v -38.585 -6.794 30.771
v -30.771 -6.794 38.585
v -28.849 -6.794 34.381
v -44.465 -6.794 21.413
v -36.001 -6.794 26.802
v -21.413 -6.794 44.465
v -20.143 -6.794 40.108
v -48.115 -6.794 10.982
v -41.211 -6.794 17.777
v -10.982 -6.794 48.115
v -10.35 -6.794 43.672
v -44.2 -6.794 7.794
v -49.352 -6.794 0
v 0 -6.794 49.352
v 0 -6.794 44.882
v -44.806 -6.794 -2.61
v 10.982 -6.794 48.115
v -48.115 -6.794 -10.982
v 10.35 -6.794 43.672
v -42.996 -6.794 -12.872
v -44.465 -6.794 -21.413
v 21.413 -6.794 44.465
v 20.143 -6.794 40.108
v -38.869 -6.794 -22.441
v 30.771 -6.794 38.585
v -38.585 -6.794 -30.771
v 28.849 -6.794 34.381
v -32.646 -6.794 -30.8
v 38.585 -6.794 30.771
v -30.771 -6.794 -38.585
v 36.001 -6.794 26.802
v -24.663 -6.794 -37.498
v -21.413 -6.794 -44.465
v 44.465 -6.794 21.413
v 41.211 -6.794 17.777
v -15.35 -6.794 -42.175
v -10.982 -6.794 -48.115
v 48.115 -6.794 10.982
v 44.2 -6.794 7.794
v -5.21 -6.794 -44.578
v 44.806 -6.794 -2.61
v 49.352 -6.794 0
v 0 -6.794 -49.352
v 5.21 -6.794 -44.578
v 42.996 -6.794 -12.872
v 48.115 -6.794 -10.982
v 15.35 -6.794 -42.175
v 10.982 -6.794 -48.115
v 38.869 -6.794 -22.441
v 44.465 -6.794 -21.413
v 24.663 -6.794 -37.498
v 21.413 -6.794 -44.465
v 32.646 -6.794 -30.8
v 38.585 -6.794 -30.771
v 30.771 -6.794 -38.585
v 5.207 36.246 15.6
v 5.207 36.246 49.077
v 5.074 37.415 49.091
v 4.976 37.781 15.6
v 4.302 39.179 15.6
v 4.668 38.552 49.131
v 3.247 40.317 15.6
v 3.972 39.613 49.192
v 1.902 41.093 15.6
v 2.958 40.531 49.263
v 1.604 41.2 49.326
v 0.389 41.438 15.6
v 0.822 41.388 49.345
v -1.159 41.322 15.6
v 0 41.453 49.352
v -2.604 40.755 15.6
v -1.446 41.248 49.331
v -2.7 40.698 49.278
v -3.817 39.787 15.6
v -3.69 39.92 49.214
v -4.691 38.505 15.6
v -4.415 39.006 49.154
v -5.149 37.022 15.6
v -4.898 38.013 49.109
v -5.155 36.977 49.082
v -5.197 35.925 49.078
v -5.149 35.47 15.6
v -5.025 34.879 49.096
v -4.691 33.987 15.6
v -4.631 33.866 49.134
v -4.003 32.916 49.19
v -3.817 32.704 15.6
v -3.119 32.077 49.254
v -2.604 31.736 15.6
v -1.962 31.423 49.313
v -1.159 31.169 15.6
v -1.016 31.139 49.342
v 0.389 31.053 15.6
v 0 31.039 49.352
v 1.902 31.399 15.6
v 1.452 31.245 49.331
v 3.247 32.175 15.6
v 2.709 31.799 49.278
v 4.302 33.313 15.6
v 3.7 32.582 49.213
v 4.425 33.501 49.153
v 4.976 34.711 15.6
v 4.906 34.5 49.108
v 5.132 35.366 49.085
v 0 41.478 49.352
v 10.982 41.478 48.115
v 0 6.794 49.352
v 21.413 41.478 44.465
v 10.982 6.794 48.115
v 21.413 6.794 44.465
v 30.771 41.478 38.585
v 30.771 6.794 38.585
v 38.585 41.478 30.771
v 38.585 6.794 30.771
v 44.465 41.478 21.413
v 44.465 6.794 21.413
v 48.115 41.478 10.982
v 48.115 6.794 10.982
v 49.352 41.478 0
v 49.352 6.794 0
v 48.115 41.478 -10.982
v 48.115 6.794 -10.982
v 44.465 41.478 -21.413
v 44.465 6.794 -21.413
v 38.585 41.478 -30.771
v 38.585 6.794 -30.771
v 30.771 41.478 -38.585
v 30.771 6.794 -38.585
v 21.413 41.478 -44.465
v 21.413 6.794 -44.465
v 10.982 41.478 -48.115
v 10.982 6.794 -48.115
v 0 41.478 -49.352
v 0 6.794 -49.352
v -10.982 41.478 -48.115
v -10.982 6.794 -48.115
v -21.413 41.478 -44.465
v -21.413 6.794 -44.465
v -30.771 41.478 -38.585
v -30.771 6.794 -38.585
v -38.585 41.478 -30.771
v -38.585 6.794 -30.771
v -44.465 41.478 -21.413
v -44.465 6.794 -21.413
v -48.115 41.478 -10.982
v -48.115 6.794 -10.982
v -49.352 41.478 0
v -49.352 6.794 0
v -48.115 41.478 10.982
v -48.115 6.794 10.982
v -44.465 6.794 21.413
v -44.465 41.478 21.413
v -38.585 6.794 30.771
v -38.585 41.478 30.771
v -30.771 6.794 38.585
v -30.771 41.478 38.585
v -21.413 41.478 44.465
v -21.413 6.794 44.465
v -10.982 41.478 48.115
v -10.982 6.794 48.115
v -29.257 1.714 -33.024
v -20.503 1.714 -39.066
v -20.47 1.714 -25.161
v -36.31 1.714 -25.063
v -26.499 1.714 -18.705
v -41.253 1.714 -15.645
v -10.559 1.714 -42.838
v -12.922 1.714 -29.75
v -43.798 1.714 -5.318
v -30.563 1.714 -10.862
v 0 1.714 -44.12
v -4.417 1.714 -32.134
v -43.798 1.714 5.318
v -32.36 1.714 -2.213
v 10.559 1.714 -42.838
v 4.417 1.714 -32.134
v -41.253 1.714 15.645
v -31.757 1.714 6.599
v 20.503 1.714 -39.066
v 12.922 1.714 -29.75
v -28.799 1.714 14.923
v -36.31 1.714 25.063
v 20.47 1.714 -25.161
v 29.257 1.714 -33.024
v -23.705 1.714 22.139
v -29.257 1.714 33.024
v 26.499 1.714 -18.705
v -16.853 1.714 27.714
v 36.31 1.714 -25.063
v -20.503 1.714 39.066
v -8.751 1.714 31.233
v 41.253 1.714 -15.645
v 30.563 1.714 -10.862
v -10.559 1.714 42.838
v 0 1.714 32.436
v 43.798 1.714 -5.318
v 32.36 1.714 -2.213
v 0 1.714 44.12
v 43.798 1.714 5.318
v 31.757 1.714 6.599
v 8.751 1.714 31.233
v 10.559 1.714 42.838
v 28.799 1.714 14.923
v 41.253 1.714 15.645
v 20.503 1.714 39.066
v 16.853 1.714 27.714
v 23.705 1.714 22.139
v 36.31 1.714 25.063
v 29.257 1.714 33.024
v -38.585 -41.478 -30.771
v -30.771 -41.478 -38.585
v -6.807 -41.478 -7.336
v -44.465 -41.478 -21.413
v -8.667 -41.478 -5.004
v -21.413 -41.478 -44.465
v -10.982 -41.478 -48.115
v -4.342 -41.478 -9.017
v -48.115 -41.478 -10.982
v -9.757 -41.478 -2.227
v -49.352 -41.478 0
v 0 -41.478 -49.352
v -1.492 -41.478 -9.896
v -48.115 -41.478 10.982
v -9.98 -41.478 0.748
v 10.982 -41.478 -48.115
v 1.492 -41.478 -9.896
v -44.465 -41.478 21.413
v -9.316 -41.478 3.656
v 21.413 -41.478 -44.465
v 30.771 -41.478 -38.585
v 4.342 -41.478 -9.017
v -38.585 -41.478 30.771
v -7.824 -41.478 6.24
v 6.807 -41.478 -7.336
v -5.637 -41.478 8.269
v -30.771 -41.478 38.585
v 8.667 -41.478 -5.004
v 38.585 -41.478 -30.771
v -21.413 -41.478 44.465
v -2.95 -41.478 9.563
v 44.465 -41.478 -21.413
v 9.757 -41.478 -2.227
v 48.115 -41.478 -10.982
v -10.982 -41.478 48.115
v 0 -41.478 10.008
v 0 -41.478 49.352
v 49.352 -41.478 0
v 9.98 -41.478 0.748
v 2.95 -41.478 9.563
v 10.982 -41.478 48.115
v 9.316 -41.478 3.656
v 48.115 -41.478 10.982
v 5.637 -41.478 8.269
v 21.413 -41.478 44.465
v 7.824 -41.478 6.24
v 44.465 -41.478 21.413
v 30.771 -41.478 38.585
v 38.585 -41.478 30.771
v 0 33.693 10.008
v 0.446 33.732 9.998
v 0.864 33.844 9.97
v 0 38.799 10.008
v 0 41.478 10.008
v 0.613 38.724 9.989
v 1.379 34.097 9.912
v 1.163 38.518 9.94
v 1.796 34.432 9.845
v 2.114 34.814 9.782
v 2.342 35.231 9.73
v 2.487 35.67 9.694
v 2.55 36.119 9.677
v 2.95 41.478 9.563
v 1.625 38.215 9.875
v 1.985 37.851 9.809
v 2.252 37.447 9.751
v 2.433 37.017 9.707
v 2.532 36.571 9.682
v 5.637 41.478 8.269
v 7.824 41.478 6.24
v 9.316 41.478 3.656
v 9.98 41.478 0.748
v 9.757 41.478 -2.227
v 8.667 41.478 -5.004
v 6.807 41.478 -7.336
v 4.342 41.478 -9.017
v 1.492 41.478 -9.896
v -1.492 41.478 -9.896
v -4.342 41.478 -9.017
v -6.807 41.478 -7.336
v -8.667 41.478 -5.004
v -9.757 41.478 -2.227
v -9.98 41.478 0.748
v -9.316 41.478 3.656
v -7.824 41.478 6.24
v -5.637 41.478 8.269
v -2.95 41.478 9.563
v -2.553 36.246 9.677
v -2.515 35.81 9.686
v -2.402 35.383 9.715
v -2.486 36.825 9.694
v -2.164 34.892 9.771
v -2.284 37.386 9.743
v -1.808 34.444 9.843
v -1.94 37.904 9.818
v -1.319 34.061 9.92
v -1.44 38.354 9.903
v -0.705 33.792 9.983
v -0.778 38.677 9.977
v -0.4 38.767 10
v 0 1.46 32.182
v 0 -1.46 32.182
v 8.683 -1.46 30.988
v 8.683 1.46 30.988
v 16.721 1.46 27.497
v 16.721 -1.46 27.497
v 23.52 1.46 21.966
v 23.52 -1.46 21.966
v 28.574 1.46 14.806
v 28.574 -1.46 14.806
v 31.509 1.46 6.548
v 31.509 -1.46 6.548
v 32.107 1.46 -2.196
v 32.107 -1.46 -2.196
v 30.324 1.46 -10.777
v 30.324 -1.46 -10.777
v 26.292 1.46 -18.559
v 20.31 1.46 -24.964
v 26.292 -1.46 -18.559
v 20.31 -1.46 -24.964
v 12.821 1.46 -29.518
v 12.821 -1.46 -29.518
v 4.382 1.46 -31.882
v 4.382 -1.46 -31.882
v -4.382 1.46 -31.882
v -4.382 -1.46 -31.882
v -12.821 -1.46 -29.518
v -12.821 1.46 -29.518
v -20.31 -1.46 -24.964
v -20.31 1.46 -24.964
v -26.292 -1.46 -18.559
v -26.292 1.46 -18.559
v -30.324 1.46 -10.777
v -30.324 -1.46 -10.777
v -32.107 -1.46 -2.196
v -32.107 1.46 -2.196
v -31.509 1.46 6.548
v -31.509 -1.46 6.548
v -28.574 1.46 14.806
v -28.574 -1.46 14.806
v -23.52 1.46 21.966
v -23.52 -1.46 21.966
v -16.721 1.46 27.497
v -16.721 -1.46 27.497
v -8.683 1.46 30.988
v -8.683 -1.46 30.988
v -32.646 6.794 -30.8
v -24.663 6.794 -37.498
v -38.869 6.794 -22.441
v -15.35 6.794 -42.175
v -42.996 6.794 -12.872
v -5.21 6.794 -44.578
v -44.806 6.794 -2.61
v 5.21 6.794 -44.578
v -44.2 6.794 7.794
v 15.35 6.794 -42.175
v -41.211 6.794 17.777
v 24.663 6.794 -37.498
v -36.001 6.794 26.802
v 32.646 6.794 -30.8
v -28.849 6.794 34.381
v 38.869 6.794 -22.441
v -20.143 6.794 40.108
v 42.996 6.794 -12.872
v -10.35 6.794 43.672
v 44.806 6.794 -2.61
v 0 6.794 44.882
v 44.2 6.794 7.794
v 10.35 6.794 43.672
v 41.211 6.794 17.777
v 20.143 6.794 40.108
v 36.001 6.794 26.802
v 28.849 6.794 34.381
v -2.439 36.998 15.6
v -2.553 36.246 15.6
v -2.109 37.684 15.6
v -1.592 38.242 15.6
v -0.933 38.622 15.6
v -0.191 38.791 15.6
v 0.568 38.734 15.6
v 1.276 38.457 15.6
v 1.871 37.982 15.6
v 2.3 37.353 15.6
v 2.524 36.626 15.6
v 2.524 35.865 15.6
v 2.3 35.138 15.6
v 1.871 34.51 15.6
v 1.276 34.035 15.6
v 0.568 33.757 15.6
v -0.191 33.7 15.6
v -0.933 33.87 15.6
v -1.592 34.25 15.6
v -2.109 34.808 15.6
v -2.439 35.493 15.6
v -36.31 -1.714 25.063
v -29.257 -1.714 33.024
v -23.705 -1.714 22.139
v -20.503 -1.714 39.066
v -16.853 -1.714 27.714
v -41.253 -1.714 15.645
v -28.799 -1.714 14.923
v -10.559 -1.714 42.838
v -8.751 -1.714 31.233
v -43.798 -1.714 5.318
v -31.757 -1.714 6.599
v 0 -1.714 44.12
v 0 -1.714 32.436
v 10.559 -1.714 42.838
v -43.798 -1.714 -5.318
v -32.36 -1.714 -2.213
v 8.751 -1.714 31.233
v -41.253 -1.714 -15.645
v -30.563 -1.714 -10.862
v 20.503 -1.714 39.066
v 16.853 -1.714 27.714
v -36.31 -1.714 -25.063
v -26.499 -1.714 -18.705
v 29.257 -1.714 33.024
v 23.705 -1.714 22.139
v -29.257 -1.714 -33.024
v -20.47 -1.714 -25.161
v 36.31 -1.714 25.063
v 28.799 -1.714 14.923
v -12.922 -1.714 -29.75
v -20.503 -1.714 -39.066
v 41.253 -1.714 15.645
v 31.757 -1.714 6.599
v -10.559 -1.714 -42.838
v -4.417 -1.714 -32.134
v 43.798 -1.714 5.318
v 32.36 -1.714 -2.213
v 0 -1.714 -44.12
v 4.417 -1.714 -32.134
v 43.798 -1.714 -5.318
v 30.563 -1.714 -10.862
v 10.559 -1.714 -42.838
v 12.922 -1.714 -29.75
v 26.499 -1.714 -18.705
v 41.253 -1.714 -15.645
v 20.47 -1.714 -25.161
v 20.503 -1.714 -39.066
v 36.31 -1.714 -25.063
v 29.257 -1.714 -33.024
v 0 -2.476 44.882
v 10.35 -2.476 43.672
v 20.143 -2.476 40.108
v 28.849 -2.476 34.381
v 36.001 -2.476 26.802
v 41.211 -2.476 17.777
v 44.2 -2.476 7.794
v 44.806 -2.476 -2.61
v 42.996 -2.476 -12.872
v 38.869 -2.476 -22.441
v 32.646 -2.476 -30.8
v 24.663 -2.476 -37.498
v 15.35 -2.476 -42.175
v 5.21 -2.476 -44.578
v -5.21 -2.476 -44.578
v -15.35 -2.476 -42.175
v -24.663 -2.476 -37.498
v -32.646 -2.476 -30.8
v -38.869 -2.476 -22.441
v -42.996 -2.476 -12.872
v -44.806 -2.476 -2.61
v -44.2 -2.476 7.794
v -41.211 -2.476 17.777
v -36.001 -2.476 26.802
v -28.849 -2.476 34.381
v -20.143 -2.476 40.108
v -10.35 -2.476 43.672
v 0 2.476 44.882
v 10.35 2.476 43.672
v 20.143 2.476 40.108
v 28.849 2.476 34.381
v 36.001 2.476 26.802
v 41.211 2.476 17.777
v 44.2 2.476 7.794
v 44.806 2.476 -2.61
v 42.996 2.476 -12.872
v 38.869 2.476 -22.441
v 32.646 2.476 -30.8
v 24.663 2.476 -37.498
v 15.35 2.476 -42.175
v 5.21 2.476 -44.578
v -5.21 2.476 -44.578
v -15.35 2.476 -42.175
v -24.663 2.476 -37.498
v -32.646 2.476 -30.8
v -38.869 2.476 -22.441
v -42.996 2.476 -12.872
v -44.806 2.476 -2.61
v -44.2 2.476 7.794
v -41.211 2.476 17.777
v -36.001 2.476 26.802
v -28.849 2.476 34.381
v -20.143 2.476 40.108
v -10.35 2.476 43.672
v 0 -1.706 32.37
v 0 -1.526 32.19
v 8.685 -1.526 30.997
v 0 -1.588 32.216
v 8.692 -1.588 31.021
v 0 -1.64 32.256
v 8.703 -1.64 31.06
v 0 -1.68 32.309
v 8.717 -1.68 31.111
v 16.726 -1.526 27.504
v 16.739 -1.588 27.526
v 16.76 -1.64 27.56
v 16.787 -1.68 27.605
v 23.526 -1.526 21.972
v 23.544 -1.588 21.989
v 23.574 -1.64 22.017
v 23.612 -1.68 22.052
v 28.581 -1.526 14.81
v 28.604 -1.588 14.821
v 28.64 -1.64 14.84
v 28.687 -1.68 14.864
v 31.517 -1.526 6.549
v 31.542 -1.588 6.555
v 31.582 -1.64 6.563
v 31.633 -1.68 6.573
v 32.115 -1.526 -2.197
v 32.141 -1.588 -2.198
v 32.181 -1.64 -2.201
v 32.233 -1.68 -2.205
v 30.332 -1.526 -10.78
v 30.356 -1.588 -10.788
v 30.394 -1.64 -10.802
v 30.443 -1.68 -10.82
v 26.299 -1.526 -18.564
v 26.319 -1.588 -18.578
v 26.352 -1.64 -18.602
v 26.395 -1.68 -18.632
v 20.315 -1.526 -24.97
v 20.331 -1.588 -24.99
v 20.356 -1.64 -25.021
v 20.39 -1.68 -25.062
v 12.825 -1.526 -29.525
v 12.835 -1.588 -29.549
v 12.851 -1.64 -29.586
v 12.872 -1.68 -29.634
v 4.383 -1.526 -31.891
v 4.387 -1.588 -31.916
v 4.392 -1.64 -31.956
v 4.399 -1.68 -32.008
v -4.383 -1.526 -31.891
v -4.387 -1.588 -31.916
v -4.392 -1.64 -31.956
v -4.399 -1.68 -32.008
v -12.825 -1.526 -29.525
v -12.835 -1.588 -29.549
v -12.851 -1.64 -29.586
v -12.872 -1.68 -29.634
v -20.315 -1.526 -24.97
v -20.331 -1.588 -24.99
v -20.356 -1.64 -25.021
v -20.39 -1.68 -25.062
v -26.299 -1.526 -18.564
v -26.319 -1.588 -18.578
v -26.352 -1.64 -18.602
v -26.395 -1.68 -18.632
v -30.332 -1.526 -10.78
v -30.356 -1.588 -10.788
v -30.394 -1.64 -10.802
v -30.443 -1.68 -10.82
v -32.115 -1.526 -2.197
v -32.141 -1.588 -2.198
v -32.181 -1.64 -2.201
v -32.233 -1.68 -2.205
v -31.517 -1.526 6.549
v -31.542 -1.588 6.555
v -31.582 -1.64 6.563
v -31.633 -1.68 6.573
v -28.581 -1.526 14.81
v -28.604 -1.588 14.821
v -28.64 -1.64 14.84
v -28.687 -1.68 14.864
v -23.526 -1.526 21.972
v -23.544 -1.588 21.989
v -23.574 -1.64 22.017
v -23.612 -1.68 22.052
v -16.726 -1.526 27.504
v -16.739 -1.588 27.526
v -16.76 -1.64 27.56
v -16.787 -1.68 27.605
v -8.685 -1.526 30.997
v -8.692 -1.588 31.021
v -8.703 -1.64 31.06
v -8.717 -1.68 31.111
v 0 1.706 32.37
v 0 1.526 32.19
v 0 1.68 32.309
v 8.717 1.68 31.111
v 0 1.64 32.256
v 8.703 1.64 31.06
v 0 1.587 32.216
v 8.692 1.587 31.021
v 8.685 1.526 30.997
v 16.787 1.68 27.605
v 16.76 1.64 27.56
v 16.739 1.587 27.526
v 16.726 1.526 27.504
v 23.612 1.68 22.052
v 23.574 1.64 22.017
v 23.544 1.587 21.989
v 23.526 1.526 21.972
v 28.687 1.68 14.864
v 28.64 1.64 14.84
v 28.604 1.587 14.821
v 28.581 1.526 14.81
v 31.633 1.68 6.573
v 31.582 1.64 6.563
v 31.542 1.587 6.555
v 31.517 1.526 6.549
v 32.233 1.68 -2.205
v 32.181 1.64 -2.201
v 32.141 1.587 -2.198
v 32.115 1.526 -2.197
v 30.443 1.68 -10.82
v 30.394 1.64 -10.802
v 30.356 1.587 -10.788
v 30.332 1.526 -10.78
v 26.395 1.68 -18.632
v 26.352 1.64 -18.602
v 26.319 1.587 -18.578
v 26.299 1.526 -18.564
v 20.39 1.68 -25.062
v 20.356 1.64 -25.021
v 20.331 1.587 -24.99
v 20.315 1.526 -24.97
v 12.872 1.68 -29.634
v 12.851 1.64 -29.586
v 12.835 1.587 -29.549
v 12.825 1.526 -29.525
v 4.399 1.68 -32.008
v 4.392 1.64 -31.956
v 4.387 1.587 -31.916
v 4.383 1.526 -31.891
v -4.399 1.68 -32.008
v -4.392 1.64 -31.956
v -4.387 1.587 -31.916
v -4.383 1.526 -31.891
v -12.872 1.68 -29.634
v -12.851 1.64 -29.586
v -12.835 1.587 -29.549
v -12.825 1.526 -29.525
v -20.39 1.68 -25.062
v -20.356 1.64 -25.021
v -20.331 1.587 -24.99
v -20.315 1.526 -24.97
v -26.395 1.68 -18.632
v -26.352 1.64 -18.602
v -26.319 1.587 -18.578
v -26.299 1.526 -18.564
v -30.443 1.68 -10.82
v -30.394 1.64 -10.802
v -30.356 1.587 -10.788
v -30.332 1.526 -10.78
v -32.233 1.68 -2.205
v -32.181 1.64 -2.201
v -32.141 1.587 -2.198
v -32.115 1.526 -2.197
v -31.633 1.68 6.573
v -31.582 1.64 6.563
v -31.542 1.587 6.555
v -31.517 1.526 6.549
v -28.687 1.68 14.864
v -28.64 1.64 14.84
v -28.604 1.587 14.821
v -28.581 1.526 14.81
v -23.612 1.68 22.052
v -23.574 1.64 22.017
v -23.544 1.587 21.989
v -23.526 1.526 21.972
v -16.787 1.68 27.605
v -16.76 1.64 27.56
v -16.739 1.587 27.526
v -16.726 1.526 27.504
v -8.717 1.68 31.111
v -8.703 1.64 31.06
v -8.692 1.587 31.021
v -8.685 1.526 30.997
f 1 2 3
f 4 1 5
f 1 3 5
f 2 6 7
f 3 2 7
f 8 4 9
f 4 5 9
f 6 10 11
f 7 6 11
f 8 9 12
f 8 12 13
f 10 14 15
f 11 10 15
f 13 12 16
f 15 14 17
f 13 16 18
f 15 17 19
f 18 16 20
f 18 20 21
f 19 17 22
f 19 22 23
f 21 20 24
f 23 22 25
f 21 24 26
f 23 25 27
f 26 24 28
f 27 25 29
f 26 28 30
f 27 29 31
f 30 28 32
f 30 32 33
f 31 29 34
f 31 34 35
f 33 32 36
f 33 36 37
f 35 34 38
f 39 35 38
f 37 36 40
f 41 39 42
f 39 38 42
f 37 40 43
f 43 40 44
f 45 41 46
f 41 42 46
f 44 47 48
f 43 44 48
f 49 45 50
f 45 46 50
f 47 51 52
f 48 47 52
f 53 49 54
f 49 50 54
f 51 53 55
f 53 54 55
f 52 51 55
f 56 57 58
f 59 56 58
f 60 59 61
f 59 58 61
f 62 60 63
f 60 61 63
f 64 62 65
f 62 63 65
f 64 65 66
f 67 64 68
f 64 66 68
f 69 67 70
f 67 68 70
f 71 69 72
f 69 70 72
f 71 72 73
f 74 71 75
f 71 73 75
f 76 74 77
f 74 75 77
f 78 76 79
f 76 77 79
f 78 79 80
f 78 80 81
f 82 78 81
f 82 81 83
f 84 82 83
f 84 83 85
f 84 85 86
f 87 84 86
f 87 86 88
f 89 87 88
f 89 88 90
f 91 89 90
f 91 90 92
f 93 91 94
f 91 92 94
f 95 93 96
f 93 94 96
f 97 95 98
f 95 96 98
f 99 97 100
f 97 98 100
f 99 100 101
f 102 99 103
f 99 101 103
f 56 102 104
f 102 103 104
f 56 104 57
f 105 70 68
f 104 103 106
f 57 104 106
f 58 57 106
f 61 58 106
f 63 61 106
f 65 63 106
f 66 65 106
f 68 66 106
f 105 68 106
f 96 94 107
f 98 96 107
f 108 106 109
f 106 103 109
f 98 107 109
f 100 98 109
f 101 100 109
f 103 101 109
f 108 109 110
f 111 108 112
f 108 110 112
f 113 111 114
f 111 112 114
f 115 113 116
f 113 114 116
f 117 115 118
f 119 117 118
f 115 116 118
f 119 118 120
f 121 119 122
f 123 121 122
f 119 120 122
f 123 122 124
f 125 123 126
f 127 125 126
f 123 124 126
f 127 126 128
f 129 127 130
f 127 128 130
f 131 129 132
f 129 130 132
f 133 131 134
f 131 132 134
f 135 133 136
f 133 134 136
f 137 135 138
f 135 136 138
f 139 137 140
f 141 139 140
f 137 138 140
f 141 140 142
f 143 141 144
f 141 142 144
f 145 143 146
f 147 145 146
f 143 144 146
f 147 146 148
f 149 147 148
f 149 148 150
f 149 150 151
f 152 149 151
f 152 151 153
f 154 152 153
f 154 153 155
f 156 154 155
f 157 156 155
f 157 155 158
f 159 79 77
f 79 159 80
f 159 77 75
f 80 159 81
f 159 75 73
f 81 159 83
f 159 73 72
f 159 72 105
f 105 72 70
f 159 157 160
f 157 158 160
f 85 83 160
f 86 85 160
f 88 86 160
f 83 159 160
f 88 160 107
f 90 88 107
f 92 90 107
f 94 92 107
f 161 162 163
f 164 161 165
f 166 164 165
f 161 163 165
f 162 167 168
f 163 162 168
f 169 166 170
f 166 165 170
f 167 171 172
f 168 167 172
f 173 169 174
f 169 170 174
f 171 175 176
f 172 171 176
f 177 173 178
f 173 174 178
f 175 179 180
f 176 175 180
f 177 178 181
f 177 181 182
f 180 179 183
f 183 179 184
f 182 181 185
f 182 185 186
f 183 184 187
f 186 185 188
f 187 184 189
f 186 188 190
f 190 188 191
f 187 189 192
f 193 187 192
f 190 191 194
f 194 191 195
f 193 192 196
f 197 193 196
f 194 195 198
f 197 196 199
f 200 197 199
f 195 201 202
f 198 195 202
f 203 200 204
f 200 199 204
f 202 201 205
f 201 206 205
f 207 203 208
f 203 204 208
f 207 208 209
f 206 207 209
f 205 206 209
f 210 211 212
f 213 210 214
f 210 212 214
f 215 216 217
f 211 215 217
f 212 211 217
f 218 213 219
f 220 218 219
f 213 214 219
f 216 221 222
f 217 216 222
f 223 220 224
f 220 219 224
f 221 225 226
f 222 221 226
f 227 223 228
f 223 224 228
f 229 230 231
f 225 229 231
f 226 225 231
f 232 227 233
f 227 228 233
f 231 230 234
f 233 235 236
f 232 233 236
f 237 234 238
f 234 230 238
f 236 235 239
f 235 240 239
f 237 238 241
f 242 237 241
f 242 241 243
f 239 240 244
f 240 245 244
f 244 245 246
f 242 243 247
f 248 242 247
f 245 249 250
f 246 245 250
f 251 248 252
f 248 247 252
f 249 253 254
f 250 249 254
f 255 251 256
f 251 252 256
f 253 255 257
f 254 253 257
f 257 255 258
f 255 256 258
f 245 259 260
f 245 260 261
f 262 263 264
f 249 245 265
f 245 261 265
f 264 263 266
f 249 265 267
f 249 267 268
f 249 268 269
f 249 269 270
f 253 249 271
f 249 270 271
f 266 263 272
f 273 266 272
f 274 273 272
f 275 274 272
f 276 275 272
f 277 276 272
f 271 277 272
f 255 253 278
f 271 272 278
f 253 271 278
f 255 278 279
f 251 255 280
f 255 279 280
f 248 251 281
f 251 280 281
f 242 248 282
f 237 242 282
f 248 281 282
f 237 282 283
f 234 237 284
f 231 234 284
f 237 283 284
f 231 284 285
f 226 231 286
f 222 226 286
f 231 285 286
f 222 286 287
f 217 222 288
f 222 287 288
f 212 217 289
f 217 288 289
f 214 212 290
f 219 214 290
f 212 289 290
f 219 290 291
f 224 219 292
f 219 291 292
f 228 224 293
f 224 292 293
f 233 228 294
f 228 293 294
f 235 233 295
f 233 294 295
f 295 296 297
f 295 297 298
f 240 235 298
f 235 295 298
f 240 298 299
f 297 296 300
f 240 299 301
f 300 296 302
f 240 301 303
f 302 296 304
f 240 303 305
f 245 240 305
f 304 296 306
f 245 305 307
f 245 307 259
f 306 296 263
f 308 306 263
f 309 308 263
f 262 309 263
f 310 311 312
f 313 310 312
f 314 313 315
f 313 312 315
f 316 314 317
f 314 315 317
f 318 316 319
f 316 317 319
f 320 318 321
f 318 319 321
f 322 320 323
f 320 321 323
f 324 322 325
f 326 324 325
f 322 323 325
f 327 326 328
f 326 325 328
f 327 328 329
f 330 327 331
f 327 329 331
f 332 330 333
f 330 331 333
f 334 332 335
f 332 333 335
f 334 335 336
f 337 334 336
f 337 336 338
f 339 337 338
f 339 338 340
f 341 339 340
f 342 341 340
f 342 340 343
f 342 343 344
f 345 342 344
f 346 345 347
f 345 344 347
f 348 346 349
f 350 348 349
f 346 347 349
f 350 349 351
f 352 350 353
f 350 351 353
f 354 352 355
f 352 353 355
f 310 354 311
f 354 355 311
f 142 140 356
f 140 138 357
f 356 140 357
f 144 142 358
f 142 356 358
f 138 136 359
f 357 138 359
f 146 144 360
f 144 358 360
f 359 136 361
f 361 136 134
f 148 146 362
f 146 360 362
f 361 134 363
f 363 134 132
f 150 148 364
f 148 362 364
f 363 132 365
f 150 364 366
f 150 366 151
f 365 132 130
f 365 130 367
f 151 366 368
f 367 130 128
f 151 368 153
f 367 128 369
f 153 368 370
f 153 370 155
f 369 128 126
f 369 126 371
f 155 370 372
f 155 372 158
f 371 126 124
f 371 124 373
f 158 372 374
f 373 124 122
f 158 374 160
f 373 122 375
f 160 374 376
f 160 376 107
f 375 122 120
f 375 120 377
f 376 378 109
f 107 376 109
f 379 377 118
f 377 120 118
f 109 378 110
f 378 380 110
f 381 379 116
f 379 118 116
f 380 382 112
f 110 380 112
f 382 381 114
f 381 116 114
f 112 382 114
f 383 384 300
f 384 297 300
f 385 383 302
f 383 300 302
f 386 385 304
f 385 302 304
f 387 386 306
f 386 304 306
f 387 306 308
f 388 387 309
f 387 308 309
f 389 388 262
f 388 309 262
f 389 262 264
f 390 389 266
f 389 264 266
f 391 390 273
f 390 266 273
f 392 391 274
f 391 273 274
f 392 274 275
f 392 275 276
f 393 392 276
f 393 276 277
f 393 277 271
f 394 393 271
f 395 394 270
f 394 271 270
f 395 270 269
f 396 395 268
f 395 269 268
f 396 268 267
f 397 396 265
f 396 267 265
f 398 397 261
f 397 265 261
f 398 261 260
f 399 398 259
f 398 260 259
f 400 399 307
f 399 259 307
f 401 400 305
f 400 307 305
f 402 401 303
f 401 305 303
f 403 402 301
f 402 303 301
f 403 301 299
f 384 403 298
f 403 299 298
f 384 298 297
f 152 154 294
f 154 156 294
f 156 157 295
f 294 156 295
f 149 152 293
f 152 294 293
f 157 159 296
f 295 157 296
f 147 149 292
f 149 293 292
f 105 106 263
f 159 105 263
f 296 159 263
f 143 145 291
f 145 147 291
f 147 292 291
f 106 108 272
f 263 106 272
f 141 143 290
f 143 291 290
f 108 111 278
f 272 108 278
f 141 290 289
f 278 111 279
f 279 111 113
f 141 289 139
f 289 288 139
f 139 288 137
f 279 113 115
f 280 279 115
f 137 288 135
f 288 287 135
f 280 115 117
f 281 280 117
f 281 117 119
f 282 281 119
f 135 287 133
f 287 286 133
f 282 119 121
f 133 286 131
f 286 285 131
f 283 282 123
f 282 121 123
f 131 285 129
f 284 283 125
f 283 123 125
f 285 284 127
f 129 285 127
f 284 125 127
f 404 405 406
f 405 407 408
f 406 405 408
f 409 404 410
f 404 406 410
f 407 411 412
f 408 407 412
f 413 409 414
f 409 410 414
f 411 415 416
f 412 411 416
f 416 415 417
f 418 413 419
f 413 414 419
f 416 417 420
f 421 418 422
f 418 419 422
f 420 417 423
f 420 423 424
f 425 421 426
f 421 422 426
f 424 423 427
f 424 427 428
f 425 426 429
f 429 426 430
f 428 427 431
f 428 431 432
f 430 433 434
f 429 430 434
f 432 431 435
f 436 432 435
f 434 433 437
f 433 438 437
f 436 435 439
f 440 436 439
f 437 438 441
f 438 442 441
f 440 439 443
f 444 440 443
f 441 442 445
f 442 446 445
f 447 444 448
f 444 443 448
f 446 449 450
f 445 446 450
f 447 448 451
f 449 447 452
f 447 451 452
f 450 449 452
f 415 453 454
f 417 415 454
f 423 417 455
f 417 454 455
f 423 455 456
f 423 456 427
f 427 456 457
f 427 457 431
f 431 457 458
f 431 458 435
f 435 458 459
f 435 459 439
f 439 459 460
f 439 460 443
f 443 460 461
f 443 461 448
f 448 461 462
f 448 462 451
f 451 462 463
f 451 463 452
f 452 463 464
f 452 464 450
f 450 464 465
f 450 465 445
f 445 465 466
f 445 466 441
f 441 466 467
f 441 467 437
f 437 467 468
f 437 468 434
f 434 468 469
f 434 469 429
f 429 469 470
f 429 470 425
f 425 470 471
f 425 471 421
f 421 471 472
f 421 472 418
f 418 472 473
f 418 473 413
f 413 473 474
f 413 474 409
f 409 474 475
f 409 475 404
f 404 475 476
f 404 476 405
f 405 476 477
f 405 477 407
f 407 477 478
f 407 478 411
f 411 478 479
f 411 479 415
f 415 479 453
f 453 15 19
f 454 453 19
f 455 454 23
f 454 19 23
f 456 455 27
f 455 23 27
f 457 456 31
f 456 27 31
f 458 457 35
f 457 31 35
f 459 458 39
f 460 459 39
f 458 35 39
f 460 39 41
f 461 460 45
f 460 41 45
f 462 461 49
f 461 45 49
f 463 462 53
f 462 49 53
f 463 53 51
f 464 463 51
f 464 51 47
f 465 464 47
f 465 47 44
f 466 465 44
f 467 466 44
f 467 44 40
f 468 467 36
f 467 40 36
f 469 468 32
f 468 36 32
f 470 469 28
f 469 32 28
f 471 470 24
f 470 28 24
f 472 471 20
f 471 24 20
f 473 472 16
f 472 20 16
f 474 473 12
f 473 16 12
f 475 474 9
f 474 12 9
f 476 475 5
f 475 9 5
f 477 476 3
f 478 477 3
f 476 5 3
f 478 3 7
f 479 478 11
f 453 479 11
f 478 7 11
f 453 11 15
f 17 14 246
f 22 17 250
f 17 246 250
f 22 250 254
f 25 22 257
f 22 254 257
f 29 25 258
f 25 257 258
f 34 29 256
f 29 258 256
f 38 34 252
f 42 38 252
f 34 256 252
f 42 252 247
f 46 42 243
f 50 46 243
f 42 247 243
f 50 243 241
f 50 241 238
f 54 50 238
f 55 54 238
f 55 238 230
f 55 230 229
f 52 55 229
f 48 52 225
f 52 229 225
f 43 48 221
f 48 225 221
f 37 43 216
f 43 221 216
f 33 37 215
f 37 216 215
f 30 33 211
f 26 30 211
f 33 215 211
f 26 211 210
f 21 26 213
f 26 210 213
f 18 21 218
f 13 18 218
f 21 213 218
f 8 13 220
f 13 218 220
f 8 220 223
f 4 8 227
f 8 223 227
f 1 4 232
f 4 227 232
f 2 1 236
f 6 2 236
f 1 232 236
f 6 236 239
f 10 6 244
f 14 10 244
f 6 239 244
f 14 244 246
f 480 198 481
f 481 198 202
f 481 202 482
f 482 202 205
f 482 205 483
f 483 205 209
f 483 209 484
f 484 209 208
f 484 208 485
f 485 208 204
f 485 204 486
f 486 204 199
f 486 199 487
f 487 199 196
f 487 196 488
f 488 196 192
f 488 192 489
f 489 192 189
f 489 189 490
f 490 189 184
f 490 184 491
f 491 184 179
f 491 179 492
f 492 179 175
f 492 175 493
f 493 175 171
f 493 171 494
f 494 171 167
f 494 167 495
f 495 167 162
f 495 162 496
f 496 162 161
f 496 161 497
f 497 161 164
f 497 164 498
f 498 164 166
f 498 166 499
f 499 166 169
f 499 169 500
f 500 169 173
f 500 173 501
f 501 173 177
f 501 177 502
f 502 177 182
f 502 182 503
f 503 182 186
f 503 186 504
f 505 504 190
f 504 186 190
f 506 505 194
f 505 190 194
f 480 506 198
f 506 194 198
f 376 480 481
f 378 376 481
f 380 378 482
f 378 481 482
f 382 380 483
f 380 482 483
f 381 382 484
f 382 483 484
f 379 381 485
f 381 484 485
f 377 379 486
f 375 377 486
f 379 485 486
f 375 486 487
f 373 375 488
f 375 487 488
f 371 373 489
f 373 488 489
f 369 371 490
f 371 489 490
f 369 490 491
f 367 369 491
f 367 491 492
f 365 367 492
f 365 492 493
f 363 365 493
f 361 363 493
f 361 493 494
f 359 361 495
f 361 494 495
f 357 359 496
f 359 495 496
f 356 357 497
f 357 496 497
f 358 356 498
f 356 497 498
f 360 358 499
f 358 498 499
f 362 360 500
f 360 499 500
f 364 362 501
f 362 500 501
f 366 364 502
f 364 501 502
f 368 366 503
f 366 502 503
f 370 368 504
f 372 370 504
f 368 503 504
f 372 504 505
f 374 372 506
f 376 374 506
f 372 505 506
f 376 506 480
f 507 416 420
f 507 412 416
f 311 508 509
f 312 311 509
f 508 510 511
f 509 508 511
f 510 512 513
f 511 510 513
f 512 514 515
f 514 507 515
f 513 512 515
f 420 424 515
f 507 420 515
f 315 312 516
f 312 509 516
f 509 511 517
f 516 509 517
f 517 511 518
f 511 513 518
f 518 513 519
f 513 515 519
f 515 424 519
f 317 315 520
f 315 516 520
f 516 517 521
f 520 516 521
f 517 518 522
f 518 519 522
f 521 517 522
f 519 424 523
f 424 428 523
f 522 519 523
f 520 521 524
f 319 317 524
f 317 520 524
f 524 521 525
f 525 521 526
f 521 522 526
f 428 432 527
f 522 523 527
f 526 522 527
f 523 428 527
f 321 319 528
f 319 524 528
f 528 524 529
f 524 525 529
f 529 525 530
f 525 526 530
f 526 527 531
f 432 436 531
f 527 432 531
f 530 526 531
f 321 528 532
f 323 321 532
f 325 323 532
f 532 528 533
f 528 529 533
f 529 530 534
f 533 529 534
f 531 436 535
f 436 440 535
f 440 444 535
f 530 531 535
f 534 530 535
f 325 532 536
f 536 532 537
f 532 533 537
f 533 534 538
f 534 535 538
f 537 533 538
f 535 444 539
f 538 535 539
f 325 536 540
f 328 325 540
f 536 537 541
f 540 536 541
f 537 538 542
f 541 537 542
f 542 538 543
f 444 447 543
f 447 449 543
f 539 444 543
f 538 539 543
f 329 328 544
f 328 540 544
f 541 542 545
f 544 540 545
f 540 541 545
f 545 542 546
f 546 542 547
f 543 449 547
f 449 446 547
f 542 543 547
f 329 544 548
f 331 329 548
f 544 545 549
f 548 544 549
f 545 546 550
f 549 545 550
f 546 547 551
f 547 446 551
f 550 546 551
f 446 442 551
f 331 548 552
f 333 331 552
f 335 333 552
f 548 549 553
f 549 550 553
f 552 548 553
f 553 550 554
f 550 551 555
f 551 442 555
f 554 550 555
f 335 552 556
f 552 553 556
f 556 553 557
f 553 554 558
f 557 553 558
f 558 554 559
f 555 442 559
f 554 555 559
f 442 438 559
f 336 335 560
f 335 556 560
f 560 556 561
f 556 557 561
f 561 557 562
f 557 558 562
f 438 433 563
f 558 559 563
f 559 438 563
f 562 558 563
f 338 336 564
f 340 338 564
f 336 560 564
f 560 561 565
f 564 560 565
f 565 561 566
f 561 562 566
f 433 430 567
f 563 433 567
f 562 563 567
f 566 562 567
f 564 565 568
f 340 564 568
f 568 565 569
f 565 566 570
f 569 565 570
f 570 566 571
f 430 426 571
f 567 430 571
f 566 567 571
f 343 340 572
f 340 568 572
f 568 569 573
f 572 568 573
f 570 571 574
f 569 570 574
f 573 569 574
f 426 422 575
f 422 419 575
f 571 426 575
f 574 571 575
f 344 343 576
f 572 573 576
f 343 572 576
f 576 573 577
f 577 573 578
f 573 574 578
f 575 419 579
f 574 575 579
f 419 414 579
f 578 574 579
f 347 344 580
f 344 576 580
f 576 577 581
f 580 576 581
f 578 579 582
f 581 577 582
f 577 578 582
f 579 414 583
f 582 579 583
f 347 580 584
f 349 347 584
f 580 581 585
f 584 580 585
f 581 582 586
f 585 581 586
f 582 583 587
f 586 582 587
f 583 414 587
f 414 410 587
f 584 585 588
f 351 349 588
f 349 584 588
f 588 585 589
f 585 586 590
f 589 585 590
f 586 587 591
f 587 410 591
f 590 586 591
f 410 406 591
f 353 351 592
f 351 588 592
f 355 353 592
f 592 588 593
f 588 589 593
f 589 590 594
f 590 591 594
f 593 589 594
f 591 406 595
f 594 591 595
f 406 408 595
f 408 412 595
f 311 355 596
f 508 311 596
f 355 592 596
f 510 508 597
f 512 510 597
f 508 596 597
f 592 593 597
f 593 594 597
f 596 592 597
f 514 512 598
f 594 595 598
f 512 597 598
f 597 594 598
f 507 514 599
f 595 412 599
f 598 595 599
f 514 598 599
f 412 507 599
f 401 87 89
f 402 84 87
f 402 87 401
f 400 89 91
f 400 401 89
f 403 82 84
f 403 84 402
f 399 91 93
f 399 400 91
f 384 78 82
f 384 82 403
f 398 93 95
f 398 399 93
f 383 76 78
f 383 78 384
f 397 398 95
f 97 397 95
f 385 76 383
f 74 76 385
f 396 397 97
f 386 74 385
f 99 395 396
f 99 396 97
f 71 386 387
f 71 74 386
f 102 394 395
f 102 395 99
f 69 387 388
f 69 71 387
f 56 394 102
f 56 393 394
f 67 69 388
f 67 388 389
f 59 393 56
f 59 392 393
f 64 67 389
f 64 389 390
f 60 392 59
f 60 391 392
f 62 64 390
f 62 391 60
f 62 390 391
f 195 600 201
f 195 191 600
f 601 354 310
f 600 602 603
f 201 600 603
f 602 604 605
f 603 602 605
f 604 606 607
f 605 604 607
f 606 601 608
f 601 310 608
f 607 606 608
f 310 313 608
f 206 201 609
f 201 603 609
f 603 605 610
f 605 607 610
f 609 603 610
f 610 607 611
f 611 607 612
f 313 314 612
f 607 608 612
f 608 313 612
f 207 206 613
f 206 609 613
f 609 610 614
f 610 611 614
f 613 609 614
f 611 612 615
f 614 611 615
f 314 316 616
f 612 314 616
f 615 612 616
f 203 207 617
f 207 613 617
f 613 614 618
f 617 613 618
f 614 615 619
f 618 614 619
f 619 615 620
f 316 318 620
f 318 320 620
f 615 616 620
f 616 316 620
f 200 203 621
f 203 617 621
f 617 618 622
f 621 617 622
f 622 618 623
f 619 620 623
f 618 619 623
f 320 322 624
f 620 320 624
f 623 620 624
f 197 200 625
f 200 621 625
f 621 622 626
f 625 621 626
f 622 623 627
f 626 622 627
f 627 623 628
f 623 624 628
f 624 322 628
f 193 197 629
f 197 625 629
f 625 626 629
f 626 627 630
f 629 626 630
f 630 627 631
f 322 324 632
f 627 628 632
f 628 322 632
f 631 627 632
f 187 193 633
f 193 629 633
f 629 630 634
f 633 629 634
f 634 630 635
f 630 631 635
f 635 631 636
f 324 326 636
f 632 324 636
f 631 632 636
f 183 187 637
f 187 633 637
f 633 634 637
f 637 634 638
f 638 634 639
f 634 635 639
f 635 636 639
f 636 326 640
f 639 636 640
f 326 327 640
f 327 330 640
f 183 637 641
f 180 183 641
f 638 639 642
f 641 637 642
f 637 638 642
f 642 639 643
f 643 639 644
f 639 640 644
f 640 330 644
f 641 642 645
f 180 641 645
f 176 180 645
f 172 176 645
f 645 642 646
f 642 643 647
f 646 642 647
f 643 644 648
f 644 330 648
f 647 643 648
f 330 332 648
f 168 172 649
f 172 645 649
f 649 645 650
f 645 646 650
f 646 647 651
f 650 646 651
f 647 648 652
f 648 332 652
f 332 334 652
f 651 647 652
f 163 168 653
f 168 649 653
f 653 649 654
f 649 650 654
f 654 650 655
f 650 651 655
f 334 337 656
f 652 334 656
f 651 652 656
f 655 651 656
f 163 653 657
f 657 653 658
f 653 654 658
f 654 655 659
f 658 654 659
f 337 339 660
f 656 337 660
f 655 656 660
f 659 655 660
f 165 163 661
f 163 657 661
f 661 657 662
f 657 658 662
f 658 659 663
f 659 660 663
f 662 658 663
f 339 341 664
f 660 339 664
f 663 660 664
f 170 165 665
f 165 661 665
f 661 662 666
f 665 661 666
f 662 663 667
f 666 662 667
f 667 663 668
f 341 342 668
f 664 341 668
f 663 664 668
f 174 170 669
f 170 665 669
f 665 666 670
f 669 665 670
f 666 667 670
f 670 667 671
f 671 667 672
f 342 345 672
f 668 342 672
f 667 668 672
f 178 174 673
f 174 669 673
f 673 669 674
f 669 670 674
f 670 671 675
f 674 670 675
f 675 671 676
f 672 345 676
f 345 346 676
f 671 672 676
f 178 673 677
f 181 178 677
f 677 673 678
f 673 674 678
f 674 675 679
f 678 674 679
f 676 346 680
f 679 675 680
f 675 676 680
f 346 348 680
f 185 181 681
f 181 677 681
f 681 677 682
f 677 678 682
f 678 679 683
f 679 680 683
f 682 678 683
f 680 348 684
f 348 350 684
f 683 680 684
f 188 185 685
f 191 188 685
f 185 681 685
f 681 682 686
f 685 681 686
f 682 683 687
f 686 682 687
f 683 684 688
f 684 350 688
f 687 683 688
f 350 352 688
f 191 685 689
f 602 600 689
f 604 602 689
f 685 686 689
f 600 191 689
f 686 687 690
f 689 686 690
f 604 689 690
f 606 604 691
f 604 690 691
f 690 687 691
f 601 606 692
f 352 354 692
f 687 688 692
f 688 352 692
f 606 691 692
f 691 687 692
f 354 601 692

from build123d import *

# Parameters (mm, degrees)
F2_SIZE        = 0.762
F3_R           = 0.254
F6_D           = 5.1054
F6_DEPTH       = 49.3522
F6_START       = 0.2754562
F6_CBORE_D     = 10.414
F6_CBORE_DEPTH = 33.4772
F6_TIP         = 1.5338169022


with BuildPart() as f1:
    # F0 (on Right) → F1 (revolve)
    with BuildSketch(Plane.YZ):
        Polygon((-41.4782, 10.0076), (0, 10.0076), (41.4782, 10.0076), (41.4782, 49.3522), (6.7945, 49.3522), (6.7945, 44.8818), (1.7145, 44.8818), (1.7145, 32.1818), (-1.7145, 32.1818), (-1.7145, 44.8818), (-6.7945, 44.8818), (-6.7945, 49.3522), (-41.4782, 49.3522), align=None)
    revolve(axis=Axis((0, -0.9843776588, 0), (0, 1, 0)))

    # F2
    f2_edges = [f1.edges().sort_by_distance(p)[0] for p in [
        (0, 1.7145, -44.8818),
        (0, -1.7145, -44.8818),
    ]]
    chamfer(f2_edges, length=F2_SIZE)

    # F3
    f3_edges = [f1.edges().sort_by_distance(p)[0] for p in [
        (0, -1.7145, -32.1818),
        (0, 1.7145, -32.1818),
    ]]
    fillet(f3_edges, radius=F3_R)

    # F6
    # its depths count from where the whole tool has entered the part; down to there all is cleared
    with Locations(Plane.XY.offset(49.3522).offset(-F6_START)):
        with Locations((0, 36.2458)):
            CounterBoreHole(F6_D / 2, F6_CBORE_D / 2, F6_CBORE_DEPTH, depth=F6_DEPTH)
            with Locations((0, 0, -(F6_DEPTH + F6_TIP / 2))):  # 118° drill point
                Cone(0, F6_D / 2, F6_TIP, mode=Mode.SUBTRACT)


solid = f1.part
